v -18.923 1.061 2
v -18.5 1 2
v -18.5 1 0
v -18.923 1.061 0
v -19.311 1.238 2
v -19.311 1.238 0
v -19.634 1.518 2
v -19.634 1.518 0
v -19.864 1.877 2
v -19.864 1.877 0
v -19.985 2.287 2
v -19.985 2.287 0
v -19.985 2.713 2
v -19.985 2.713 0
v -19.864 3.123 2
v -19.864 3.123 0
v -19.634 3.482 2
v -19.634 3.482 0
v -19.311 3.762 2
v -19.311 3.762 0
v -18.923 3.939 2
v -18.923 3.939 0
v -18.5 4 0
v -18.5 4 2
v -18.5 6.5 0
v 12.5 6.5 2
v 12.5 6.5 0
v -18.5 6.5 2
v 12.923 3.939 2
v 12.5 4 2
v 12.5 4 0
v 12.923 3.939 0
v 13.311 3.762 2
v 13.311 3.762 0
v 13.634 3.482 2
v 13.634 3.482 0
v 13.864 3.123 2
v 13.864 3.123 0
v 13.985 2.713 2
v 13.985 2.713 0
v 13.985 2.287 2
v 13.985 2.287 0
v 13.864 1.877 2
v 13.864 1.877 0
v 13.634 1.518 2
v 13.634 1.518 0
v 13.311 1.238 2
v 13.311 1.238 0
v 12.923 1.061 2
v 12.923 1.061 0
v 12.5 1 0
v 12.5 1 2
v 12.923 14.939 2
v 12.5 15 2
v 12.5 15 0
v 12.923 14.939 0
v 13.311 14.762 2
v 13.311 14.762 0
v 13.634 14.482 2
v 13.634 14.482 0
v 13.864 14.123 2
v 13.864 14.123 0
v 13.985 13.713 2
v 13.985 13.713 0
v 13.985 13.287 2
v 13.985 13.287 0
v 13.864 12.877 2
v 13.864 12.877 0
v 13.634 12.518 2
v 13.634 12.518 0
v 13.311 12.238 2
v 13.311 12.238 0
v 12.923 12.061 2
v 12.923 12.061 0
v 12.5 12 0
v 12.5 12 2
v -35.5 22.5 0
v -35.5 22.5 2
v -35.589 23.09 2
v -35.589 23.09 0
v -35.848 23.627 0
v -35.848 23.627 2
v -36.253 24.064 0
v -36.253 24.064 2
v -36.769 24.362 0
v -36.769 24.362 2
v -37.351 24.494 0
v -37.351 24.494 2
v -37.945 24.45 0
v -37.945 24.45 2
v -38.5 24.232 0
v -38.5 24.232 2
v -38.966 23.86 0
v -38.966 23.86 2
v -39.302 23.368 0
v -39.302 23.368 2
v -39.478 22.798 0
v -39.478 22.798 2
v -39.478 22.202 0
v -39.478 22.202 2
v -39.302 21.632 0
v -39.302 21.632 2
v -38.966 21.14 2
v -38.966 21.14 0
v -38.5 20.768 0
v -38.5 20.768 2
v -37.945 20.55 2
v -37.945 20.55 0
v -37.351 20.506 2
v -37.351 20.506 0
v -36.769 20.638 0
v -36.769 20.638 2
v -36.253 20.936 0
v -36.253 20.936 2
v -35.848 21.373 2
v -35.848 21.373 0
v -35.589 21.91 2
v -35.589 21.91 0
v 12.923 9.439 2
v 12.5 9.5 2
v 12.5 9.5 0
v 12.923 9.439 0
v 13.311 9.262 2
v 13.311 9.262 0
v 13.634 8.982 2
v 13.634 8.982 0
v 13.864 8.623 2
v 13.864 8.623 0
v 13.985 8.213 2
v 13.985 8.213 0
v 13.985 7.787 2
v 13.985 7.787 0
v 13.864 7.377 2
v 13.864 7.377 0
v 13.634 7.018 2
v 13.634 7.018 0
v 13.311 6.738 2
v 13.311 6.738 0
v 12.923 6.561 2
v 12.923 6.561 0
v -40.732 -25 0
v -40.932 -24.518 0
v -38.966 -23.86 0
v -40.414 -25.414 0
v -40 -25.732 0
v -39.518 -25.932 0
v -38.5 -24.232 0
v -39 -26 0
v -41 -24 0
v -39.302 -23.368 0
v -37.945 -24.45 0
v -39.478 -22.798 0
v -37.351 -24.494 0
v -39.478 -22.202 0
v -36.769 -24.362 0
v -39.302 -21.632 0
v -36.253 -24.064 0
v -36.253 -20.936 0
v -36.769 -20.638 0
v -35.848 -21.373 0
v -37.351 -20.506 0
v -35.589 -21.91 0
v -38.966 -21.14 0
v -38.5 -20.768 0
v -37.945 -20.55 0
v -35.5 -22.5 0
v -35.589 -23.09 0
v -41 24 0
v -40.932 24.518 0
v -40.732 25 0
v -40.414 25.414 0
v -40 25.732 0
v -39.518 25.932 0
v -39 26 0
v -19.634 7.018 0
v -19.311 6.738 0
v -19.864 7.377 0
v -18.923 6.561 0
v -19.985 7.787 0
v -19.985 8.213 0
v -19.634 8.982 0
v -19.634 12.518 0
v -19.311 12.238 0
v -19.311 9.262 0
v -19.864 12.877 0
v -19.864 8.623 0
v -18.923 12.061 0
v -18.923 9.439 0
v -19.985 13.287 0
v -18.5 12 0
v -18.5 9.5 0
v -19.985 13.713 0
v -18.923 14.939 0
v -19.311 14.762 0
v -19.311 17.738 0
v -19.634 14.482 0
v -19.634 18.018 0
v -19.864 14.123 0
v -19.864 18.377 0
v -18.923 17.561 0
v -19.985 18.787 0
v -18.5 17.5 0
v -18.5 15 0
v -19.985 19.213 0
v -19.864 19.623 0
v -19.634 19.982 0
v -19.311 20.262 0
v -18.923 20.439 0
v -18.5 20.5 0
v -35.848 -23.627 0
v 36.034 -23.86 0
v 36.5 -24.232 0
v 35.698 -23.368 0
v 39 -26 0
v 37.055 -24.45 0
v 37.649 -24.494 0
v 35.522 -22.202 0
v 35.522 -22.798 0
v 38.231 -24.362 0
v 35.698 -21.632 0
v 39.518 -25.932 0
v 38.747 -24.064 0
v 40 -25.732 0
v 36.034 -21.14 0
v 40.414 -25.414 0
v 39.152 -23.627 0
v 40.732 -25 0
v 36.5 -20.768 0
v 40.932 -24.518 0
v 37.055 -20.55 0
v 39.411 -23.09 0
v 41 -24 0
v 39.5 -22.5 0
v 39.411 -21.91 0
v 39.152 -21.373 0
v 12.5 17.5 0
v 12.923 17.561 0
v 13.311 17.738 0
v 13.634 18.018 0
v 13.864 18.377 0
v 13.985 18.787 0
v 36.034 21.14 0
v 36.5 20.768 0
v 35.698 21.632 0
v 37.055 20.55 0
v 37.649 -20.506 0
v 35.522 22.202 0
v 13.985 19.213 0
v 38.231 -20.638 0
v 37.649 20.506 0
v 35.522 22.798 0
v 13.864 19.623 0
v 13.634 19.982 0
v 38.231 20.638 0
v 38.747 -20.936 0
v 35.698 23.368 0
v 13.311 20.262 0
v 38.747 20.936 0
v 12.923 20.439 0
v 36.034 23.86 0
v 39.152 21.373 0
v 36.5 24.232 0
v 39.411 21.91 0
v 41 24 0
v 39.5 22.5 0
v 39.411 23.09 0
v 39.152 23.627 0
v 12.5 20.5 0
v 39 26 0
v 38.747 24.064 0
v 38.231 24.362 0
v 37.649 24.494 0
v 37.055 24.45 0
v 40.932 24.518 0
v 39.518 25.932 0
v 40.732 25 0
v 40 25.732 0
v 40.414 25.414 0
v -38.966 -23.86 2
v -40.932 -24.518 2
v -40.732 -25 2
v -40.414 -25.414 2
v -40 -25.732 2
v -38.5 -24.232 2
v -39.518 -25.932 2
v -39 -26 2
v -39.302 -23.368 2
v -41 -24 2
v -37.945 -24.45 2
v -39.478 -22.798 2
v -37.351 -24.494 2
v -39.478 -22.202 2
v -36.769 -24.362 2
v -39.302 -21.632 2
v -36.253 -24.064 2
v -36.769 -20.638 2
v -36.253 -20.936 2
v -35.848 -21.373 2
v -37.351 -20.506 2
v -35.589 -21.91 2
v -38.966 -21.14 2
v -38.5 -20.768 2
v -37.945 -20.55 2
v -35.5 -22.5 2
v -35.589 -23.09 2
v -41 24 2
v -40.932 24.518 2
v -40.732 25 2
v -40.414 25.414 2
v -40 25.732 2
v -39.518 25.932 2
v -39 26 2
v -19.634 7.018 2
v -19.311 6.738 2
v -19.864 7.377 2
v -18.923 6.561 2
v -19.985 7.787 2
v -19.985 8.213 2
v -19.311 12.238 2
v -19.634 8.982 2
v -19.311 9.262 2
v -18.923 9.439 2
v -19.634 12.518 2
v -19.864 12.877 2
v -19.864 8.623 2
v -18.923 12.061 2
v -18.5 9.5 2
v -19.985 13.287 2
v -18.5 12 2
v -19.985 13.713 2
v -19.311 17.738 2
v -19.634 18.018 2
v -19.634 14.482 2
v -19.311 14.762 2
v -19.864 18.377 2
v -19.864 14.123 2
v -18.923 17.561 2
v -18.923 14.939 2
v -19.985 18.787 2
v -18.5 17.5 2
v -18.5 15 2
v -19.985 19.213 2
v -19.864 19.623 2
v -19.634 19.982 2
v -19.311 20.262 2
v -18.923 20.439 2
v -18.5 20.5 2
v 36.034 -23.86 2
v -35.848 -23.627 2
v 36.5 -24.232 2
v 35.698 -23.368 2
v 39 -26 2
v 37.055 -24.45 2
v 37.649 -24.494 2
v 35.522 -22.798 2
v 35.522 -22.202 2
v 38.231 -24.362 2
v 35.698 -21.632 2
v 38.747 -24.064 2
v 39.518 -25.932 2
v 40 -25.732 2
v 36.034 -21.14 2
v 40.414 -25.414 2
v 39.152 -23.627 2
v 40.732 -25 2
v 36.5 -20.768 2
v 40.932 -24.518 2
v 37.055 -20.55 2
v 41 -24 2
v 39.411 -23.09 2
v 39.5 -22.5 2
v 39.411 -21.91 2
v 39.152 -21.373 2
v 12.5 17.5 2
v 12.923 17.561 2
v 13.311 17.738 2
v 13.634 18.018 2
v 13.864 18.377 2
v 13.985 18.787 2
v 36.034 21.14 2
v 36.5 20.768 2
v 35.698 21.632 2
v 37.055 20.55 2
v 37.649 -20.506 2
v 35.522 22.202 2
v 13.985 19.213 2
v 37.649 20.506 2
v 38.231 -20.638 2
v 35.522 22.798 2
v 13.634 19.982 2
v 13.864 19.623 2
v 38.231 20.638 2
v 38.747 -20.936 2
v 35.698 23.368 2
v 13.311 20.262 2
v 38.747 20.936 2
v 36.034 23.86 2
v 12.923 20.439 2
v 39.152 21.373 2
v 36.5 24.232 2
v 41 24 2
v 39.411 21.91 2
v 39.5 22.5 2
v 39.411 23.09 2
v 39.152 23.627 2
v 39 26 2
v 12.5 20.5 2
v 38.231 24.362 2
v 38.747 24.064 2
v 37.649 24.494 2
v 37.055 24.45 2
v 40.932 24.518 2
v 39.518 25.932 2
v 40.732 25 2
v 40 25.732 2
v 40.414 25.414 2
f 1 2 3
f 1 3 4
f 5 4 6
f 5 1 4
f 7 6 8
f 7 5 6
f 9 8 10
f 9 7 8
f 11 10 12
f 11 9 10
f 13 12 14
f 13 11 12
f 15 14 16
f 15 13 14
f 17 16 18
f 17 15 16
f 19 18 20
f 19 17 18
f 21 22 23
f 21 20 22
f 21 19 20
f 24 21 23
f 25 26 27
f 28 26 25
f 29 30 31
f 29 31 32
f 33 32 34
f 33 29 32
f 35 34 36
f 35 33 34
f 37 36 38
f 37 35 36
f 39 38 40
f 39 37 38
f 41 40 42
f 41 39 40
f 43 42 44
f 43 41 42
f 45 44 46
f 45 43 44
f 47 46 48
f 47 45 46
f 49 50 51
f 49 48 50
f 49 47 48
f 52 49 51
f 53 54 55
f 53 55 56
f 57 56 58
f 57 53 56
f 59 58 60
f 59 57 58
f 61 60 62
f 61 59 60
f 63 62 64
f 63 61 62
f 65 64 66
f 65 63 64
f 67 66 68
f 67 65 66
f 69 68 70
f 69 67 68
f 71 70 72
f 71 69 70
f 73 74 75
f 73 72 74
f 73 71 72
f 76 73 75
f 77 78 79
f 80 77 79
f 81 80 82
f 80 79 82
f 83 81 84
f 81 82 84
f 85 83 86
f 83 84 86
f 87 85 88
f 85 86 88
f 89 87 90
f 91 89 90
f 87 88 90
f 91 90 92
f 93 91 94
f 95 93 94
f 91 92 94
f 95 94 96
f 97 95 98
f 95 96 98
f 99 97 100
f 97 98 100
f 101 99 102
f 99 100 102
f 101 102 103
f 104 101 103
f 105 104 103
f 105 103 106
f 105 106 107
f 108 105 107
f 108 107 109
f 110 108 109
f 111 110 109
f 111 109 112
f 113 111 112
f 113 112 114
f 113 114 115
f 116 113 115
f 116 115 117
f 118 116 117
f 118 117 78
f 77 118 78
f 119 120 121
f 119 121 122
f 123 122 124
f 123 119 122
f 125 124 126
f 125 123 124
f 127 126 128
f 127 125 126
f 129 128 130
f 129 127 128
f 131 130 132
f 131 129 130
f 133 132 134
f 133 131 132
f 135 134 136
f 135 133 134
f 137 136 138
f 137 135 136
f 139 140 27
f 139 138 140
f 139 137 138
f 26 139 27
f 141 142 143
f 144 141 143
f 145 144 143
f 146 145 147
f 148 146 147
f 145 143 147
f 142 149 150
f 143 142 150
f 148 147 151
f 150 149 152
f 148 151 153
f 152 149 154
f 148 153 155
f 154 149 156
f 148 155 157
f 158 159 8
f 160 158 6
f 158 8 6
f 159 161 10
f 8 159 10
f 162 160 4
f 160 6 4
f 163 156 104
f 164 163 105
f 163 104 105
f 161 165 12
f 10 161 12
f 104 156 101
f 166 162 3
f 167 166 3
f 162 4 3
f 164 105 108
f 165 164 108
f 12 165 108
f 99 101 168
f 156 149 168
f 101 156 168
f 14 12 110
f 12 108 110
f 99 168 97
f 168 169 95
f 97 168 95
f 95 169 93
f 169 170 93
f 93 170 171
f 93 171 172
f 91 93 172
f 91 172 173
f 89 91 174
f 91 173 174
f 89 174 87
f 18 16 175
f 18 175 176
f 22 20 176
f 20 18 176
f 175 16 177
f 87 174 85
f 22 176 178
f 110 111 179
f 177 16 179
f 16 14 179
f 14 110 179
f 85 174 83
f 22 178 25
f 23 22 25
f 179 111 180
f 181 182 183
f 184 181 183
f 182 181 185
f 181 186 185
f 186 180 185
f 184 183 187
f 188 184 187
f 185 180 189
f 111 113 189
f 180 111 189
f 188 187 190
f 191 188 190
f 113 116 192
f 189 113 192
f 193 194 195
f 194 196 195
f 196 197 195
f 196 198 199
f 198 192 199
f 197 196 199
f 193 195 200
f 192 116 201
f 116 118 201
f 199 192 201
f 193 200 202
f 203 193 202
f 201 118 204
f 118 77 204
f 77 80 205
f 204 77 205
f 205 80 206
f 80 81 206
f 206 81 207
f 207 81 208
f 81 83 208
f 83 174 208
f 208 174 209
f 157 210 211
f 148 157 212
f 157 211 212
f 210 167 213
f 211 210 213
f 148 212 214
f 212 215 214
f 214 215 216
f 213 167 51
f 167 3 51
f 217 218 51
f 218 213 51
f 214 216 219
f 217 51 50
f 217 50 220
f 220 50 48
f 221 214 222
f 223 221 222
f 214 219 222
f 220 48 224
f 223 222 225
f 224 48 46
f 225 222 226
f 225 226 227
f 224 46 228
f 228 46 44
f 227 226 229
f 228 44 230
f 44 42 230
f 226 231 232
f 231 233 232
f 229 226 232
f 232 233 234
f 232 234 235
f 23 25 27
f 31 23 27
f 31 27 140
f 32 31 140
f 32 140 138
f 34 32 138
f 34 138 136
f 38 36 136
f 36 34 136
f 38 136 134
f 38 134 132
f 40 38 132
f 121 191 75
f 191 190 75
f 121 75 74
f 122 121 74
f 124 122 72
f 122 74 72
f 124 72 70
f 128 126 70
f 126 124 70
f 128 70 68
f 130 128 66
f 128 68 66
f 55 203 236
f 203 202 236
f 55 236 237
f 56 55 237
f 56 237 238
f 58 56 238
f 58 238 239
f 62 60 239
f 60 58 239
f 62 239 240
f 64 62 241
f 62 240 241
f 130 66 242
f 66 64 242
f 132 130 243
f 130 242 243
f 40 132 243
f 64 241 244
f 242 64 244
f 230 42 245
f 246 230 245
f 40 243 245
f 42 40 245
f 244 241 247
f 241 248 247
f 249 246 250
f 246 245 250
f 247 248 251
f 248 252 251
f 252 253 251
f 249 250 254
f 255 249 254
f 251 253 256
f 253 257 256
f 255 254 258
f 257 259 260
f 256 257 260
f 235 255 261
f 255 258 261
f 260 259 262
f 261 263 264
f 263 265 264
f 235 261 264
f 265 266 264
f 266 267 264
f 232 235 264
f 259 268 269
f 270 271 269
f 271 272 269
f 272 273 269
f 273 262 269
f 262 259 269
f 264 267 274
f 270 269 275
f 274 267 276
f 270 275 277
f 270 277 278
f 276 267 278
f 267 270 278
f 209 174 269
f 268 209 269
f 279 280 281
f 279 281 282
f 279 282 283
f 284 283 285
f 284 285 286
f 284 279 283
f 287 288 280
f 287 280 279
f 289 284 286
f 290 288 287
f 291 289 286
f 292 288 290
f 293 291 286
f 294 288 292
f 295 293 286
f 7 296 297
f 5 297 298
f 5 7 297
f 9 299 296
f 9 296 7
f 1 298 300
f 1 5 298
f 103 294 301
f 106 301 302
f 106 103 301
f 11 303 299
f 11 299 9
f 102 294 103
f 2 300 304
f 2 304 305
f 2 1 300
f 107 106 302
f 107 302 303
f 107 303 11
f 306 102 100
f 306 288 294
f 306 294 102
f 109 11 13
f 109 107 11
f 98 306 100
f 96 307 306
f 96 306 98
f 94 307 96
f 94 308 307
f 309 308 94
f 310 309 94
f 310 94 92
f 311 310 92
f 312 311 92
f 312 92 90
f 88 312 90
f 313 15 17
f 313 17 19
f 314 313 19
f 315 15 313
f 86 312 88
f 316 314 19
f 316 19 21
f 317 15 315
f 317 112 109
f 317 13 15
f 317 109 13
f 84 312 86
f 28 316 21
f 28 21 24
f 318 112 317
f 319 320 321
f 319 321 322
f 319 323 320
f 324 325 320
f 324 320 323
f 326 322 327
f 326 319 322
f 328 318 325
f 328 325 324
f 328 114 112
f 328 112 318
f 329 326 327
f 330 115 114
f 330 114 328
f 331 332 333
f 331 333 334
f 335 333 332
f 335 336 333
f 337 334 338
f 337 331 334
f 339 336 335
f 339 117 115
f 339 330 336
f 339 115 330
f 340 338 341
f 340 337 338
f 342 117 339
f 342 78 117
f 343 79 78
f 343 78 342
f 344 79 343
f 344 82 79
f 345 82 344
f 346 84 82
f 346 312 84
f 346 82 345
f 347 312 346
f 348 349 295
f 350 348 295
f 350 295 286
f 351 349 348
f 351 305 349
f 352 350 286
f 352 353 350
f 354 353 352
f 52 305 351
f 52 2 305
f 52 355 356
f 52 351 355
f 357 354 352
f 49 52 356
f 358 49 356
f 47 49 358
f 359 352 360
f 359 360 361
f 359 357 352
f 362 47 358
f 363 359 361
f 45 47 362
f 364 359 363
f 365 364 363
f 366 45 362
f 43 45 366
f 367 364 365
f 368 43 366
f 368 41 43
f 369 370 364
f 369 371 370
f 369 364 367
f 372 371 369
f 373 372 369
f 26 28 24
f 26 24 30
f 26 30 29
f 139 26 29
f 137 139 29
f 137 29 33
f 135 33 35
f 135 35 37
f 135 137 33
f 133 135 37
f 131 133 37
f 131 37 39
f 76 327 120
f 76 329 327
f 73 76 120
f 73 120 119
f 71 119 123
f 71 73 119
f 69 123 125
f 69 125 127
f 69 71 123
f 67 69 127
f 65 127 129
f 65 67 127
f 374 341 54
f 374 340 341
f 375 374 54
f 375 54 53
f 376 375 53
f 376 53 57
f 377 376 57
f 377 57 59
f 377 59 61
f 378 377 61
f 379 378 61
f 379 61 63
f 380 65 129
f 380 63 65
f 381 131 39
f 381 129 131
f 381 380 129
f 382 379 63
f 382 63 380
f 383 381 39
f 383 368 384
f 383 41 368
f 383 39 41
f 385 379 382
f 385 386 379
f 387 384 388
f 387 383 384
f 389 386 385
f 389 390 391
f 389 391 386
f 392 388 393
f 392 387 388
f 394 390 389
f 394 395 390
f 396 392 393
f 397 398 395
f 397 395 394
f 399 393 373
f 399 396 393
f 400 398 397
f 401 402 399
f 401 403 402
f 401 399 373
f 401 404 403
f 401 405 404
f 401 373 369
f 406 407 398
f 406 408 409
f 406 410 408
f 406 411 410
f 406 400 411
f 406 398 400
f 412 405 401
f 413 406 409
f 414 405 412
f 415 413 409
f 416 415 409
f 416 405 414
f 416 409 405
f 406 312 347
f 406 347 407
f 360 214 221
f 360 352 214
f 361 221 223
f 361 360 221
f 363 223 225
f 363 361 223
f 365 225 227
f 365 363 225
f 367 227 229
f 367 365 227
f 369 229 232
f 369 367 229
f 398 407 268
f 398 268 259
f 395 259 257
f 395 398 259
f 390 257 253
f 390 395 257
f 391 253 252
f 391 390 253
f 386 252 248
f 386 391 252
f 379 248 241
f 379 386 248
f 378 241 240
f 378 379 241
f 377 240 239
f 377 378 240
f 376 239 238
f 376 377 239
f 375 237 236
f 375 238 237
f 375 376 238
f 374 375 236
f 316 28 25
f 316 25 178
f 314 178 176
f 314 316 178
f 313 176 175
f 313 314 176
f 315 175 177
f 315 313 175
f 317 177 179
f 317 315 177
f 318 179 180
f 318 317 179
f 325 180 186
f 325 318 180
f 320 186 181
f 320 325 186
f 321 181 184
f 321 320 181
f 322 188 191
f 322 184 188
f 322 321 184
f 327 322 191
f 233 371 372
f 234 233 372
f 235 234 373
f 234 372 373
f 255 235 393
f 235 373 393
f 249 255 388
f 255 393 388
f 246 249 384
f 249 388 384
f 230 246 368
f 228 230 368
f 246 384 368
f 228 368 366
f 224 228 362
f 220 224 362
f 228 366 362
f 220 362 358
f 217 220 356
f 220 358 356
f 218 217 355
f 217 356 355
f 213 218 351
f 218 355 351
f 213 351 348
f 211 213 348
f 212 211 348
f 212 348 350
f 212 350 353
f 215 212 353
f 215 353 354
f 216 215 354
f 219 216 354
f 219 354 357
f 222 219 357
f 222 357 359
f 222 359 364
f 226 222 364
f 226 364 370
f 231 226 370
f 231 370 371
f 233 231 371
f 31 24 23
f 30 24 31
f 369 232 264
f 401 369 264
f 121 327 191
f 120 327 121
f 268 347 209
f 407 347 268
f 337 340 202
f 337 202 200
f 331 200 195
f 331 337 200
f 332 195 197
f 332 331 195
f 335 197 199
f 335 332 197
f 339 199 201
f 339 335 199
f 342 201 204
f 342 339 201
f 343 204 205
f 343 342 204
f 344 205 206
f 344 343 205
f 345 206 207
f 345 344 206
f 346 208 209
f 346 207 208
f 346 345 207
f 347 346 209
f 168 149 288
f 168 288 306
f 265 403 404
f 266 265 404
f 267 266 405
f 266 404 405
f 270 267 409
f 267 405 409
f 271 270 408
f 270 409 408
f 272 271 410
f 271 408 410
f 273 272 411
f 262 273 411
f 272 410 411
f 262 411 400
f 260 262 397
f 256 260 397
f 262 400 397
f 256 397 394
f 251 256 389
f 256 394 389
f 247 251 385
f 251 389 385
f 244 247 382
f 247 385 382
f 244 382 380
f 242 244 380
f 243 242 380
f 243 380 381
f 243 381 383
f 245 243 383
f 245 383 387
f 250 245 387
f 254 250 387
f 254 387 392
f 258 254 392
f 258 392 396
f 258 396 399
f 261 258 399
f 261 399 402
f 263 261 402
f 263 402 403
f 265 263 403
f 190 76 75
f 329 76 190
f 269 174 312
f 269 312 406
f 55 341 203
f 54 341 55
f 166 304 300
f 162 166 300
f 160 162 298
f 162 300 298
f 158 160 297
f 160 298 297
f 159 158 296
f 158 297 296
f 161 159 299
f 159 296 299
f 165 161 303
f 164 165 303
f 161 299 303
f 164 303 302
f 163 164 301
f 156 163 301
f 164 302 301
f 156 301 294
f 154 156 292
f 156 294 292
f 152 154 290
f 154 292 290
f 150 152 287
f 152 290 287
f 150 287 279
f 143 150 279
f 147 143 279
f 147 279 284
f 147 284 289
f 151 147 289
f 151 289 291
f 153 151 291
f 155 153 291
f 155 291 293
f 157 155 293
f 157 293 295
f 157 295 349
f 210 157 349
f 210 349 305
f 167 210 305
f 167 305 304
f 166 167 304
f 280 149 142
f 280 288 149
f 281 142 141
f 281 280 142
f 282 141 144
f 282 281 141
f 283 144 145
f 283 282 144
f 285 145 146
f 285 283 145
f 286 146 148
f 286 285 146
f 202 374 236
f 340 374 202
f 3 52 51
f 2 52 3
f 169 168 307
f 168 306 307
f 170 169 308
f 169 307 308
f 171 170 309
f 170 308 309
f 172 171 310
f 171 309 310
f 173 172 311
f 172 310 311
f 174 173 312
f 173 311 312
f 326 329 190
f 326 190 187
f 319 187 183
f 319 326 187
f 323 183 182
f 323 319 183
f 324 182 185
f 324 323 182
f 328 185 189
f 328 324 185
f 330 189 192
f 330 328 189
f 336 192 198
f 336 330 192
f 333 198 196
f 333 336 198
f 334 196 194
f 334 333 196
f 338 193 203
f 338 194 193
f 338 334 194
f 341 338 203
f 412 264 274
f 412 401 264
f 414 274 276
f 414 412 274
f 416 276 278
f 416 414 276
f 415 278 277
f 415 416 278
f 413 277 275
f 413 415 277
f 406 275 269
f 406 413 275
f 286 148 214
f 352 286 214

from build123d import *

# Parameters (mm, degrees)
SKETCH1_W           = 82
SKETCH1_H           = 52
BOSS_EXTRUDE1_DEPTH = 2
FILLET1_R           = 2
CUT_EXTRUDE1_DEPTH  = 49.590122453
SKETCH3_R           = 2
CUT_EXTRUDE2_DEPTH  = 49.590122453


with BuildPart() as part:
    # Sketch1 → Boss-Extrude1 (new body)
    with BuildSketch(Plane.XY):
        Rectangle(SKETCH1_W, SKETCH1_H)
    extrude(amount=BOSS_EXTRUDE1_DEPTH)

    # Fillet1
    fillet1_edges = [part.edges().sort_by_distance(p)[0] for p in [
        (-41, 26, 1),
        (41, 26, 1),
        (41, -26, 1),
        (-41, -26, 1),
    ]]
    fillet(fillet1_edges, radius=FILLET1_R)

    # Sketch2 → Cut-Extrude1 (cut, through all)
    with BuildSketch(Plane.XY.offset(2)):
        with BuildLine():
            Line((-18.5, 20.5), (12.5, 20.5))
            ThreePointArc((12.5, 20.5), (14, 19), (12.5, 17.5))
            Line((12.5, 17.5), (-18.5, 17.5))
            ThreePointArc((-18.5, 17.5), (-20, 19), (-18.5, 20.5))
        make_face()
        with BuildLine():
            Line((-18.5, 15), (12.5, 15))
            ThreePointArc((12.5, 15), (14, 13.5), (12.5, 12))
            Line((12.5, 12), (-18.5, 12))
            ThreePointArc((-18.5, 12), (-20, 13.5), (-18.5, 15))
        make_face()
        with BuildLine():
            Line((-18.5, 9.5), (12.5, 9.5))
            ThreePointArc((12.5, 9.5), (14, 8), (12.5, 6.5))
            Line((12.5, 6.5), (-18.5, 6.5))
            ThreePointArc((-18.5, 6.5), (-20, 8), (-18.5, 9.5))
        make_face()
        with BuildLine():
            Line((-18.5, 4), (12.5, 4))
            ThreePointArc((12.5, 4), (14, 2.5), (12.5, 1))
            Line((12.5, 1), (-18.5, 1))
            ThreePointArc((-18.5, 1), (-20, 2.5), (-18.5, 4))
        make_face()
    extrude(amount=-CUT_EXTRUDE1_DEPTH, mode=Mode.SUBTRACT)

    # Sketch3 → Cut-Extrude2 (cut, through all)
    with BuildSketch(Plane.XY.offset(2)):
        with Locations((37.5, 22.5)):
            Circle(SKETCH3_R)
        with Locations((-37.5, 22.5)):
            Circle(SKETCH3_R)
        with Locations((37.5, -22.5)):
            Circle(SKETCH3_R)
        with Locations((-37.5, -22.5)):
            Circle(SKETCH3_R)
    extrude(amount=-CUT_EXTRUDE2_DEPTH, mode=Mode.SUBTRACT)


solid = part.part
